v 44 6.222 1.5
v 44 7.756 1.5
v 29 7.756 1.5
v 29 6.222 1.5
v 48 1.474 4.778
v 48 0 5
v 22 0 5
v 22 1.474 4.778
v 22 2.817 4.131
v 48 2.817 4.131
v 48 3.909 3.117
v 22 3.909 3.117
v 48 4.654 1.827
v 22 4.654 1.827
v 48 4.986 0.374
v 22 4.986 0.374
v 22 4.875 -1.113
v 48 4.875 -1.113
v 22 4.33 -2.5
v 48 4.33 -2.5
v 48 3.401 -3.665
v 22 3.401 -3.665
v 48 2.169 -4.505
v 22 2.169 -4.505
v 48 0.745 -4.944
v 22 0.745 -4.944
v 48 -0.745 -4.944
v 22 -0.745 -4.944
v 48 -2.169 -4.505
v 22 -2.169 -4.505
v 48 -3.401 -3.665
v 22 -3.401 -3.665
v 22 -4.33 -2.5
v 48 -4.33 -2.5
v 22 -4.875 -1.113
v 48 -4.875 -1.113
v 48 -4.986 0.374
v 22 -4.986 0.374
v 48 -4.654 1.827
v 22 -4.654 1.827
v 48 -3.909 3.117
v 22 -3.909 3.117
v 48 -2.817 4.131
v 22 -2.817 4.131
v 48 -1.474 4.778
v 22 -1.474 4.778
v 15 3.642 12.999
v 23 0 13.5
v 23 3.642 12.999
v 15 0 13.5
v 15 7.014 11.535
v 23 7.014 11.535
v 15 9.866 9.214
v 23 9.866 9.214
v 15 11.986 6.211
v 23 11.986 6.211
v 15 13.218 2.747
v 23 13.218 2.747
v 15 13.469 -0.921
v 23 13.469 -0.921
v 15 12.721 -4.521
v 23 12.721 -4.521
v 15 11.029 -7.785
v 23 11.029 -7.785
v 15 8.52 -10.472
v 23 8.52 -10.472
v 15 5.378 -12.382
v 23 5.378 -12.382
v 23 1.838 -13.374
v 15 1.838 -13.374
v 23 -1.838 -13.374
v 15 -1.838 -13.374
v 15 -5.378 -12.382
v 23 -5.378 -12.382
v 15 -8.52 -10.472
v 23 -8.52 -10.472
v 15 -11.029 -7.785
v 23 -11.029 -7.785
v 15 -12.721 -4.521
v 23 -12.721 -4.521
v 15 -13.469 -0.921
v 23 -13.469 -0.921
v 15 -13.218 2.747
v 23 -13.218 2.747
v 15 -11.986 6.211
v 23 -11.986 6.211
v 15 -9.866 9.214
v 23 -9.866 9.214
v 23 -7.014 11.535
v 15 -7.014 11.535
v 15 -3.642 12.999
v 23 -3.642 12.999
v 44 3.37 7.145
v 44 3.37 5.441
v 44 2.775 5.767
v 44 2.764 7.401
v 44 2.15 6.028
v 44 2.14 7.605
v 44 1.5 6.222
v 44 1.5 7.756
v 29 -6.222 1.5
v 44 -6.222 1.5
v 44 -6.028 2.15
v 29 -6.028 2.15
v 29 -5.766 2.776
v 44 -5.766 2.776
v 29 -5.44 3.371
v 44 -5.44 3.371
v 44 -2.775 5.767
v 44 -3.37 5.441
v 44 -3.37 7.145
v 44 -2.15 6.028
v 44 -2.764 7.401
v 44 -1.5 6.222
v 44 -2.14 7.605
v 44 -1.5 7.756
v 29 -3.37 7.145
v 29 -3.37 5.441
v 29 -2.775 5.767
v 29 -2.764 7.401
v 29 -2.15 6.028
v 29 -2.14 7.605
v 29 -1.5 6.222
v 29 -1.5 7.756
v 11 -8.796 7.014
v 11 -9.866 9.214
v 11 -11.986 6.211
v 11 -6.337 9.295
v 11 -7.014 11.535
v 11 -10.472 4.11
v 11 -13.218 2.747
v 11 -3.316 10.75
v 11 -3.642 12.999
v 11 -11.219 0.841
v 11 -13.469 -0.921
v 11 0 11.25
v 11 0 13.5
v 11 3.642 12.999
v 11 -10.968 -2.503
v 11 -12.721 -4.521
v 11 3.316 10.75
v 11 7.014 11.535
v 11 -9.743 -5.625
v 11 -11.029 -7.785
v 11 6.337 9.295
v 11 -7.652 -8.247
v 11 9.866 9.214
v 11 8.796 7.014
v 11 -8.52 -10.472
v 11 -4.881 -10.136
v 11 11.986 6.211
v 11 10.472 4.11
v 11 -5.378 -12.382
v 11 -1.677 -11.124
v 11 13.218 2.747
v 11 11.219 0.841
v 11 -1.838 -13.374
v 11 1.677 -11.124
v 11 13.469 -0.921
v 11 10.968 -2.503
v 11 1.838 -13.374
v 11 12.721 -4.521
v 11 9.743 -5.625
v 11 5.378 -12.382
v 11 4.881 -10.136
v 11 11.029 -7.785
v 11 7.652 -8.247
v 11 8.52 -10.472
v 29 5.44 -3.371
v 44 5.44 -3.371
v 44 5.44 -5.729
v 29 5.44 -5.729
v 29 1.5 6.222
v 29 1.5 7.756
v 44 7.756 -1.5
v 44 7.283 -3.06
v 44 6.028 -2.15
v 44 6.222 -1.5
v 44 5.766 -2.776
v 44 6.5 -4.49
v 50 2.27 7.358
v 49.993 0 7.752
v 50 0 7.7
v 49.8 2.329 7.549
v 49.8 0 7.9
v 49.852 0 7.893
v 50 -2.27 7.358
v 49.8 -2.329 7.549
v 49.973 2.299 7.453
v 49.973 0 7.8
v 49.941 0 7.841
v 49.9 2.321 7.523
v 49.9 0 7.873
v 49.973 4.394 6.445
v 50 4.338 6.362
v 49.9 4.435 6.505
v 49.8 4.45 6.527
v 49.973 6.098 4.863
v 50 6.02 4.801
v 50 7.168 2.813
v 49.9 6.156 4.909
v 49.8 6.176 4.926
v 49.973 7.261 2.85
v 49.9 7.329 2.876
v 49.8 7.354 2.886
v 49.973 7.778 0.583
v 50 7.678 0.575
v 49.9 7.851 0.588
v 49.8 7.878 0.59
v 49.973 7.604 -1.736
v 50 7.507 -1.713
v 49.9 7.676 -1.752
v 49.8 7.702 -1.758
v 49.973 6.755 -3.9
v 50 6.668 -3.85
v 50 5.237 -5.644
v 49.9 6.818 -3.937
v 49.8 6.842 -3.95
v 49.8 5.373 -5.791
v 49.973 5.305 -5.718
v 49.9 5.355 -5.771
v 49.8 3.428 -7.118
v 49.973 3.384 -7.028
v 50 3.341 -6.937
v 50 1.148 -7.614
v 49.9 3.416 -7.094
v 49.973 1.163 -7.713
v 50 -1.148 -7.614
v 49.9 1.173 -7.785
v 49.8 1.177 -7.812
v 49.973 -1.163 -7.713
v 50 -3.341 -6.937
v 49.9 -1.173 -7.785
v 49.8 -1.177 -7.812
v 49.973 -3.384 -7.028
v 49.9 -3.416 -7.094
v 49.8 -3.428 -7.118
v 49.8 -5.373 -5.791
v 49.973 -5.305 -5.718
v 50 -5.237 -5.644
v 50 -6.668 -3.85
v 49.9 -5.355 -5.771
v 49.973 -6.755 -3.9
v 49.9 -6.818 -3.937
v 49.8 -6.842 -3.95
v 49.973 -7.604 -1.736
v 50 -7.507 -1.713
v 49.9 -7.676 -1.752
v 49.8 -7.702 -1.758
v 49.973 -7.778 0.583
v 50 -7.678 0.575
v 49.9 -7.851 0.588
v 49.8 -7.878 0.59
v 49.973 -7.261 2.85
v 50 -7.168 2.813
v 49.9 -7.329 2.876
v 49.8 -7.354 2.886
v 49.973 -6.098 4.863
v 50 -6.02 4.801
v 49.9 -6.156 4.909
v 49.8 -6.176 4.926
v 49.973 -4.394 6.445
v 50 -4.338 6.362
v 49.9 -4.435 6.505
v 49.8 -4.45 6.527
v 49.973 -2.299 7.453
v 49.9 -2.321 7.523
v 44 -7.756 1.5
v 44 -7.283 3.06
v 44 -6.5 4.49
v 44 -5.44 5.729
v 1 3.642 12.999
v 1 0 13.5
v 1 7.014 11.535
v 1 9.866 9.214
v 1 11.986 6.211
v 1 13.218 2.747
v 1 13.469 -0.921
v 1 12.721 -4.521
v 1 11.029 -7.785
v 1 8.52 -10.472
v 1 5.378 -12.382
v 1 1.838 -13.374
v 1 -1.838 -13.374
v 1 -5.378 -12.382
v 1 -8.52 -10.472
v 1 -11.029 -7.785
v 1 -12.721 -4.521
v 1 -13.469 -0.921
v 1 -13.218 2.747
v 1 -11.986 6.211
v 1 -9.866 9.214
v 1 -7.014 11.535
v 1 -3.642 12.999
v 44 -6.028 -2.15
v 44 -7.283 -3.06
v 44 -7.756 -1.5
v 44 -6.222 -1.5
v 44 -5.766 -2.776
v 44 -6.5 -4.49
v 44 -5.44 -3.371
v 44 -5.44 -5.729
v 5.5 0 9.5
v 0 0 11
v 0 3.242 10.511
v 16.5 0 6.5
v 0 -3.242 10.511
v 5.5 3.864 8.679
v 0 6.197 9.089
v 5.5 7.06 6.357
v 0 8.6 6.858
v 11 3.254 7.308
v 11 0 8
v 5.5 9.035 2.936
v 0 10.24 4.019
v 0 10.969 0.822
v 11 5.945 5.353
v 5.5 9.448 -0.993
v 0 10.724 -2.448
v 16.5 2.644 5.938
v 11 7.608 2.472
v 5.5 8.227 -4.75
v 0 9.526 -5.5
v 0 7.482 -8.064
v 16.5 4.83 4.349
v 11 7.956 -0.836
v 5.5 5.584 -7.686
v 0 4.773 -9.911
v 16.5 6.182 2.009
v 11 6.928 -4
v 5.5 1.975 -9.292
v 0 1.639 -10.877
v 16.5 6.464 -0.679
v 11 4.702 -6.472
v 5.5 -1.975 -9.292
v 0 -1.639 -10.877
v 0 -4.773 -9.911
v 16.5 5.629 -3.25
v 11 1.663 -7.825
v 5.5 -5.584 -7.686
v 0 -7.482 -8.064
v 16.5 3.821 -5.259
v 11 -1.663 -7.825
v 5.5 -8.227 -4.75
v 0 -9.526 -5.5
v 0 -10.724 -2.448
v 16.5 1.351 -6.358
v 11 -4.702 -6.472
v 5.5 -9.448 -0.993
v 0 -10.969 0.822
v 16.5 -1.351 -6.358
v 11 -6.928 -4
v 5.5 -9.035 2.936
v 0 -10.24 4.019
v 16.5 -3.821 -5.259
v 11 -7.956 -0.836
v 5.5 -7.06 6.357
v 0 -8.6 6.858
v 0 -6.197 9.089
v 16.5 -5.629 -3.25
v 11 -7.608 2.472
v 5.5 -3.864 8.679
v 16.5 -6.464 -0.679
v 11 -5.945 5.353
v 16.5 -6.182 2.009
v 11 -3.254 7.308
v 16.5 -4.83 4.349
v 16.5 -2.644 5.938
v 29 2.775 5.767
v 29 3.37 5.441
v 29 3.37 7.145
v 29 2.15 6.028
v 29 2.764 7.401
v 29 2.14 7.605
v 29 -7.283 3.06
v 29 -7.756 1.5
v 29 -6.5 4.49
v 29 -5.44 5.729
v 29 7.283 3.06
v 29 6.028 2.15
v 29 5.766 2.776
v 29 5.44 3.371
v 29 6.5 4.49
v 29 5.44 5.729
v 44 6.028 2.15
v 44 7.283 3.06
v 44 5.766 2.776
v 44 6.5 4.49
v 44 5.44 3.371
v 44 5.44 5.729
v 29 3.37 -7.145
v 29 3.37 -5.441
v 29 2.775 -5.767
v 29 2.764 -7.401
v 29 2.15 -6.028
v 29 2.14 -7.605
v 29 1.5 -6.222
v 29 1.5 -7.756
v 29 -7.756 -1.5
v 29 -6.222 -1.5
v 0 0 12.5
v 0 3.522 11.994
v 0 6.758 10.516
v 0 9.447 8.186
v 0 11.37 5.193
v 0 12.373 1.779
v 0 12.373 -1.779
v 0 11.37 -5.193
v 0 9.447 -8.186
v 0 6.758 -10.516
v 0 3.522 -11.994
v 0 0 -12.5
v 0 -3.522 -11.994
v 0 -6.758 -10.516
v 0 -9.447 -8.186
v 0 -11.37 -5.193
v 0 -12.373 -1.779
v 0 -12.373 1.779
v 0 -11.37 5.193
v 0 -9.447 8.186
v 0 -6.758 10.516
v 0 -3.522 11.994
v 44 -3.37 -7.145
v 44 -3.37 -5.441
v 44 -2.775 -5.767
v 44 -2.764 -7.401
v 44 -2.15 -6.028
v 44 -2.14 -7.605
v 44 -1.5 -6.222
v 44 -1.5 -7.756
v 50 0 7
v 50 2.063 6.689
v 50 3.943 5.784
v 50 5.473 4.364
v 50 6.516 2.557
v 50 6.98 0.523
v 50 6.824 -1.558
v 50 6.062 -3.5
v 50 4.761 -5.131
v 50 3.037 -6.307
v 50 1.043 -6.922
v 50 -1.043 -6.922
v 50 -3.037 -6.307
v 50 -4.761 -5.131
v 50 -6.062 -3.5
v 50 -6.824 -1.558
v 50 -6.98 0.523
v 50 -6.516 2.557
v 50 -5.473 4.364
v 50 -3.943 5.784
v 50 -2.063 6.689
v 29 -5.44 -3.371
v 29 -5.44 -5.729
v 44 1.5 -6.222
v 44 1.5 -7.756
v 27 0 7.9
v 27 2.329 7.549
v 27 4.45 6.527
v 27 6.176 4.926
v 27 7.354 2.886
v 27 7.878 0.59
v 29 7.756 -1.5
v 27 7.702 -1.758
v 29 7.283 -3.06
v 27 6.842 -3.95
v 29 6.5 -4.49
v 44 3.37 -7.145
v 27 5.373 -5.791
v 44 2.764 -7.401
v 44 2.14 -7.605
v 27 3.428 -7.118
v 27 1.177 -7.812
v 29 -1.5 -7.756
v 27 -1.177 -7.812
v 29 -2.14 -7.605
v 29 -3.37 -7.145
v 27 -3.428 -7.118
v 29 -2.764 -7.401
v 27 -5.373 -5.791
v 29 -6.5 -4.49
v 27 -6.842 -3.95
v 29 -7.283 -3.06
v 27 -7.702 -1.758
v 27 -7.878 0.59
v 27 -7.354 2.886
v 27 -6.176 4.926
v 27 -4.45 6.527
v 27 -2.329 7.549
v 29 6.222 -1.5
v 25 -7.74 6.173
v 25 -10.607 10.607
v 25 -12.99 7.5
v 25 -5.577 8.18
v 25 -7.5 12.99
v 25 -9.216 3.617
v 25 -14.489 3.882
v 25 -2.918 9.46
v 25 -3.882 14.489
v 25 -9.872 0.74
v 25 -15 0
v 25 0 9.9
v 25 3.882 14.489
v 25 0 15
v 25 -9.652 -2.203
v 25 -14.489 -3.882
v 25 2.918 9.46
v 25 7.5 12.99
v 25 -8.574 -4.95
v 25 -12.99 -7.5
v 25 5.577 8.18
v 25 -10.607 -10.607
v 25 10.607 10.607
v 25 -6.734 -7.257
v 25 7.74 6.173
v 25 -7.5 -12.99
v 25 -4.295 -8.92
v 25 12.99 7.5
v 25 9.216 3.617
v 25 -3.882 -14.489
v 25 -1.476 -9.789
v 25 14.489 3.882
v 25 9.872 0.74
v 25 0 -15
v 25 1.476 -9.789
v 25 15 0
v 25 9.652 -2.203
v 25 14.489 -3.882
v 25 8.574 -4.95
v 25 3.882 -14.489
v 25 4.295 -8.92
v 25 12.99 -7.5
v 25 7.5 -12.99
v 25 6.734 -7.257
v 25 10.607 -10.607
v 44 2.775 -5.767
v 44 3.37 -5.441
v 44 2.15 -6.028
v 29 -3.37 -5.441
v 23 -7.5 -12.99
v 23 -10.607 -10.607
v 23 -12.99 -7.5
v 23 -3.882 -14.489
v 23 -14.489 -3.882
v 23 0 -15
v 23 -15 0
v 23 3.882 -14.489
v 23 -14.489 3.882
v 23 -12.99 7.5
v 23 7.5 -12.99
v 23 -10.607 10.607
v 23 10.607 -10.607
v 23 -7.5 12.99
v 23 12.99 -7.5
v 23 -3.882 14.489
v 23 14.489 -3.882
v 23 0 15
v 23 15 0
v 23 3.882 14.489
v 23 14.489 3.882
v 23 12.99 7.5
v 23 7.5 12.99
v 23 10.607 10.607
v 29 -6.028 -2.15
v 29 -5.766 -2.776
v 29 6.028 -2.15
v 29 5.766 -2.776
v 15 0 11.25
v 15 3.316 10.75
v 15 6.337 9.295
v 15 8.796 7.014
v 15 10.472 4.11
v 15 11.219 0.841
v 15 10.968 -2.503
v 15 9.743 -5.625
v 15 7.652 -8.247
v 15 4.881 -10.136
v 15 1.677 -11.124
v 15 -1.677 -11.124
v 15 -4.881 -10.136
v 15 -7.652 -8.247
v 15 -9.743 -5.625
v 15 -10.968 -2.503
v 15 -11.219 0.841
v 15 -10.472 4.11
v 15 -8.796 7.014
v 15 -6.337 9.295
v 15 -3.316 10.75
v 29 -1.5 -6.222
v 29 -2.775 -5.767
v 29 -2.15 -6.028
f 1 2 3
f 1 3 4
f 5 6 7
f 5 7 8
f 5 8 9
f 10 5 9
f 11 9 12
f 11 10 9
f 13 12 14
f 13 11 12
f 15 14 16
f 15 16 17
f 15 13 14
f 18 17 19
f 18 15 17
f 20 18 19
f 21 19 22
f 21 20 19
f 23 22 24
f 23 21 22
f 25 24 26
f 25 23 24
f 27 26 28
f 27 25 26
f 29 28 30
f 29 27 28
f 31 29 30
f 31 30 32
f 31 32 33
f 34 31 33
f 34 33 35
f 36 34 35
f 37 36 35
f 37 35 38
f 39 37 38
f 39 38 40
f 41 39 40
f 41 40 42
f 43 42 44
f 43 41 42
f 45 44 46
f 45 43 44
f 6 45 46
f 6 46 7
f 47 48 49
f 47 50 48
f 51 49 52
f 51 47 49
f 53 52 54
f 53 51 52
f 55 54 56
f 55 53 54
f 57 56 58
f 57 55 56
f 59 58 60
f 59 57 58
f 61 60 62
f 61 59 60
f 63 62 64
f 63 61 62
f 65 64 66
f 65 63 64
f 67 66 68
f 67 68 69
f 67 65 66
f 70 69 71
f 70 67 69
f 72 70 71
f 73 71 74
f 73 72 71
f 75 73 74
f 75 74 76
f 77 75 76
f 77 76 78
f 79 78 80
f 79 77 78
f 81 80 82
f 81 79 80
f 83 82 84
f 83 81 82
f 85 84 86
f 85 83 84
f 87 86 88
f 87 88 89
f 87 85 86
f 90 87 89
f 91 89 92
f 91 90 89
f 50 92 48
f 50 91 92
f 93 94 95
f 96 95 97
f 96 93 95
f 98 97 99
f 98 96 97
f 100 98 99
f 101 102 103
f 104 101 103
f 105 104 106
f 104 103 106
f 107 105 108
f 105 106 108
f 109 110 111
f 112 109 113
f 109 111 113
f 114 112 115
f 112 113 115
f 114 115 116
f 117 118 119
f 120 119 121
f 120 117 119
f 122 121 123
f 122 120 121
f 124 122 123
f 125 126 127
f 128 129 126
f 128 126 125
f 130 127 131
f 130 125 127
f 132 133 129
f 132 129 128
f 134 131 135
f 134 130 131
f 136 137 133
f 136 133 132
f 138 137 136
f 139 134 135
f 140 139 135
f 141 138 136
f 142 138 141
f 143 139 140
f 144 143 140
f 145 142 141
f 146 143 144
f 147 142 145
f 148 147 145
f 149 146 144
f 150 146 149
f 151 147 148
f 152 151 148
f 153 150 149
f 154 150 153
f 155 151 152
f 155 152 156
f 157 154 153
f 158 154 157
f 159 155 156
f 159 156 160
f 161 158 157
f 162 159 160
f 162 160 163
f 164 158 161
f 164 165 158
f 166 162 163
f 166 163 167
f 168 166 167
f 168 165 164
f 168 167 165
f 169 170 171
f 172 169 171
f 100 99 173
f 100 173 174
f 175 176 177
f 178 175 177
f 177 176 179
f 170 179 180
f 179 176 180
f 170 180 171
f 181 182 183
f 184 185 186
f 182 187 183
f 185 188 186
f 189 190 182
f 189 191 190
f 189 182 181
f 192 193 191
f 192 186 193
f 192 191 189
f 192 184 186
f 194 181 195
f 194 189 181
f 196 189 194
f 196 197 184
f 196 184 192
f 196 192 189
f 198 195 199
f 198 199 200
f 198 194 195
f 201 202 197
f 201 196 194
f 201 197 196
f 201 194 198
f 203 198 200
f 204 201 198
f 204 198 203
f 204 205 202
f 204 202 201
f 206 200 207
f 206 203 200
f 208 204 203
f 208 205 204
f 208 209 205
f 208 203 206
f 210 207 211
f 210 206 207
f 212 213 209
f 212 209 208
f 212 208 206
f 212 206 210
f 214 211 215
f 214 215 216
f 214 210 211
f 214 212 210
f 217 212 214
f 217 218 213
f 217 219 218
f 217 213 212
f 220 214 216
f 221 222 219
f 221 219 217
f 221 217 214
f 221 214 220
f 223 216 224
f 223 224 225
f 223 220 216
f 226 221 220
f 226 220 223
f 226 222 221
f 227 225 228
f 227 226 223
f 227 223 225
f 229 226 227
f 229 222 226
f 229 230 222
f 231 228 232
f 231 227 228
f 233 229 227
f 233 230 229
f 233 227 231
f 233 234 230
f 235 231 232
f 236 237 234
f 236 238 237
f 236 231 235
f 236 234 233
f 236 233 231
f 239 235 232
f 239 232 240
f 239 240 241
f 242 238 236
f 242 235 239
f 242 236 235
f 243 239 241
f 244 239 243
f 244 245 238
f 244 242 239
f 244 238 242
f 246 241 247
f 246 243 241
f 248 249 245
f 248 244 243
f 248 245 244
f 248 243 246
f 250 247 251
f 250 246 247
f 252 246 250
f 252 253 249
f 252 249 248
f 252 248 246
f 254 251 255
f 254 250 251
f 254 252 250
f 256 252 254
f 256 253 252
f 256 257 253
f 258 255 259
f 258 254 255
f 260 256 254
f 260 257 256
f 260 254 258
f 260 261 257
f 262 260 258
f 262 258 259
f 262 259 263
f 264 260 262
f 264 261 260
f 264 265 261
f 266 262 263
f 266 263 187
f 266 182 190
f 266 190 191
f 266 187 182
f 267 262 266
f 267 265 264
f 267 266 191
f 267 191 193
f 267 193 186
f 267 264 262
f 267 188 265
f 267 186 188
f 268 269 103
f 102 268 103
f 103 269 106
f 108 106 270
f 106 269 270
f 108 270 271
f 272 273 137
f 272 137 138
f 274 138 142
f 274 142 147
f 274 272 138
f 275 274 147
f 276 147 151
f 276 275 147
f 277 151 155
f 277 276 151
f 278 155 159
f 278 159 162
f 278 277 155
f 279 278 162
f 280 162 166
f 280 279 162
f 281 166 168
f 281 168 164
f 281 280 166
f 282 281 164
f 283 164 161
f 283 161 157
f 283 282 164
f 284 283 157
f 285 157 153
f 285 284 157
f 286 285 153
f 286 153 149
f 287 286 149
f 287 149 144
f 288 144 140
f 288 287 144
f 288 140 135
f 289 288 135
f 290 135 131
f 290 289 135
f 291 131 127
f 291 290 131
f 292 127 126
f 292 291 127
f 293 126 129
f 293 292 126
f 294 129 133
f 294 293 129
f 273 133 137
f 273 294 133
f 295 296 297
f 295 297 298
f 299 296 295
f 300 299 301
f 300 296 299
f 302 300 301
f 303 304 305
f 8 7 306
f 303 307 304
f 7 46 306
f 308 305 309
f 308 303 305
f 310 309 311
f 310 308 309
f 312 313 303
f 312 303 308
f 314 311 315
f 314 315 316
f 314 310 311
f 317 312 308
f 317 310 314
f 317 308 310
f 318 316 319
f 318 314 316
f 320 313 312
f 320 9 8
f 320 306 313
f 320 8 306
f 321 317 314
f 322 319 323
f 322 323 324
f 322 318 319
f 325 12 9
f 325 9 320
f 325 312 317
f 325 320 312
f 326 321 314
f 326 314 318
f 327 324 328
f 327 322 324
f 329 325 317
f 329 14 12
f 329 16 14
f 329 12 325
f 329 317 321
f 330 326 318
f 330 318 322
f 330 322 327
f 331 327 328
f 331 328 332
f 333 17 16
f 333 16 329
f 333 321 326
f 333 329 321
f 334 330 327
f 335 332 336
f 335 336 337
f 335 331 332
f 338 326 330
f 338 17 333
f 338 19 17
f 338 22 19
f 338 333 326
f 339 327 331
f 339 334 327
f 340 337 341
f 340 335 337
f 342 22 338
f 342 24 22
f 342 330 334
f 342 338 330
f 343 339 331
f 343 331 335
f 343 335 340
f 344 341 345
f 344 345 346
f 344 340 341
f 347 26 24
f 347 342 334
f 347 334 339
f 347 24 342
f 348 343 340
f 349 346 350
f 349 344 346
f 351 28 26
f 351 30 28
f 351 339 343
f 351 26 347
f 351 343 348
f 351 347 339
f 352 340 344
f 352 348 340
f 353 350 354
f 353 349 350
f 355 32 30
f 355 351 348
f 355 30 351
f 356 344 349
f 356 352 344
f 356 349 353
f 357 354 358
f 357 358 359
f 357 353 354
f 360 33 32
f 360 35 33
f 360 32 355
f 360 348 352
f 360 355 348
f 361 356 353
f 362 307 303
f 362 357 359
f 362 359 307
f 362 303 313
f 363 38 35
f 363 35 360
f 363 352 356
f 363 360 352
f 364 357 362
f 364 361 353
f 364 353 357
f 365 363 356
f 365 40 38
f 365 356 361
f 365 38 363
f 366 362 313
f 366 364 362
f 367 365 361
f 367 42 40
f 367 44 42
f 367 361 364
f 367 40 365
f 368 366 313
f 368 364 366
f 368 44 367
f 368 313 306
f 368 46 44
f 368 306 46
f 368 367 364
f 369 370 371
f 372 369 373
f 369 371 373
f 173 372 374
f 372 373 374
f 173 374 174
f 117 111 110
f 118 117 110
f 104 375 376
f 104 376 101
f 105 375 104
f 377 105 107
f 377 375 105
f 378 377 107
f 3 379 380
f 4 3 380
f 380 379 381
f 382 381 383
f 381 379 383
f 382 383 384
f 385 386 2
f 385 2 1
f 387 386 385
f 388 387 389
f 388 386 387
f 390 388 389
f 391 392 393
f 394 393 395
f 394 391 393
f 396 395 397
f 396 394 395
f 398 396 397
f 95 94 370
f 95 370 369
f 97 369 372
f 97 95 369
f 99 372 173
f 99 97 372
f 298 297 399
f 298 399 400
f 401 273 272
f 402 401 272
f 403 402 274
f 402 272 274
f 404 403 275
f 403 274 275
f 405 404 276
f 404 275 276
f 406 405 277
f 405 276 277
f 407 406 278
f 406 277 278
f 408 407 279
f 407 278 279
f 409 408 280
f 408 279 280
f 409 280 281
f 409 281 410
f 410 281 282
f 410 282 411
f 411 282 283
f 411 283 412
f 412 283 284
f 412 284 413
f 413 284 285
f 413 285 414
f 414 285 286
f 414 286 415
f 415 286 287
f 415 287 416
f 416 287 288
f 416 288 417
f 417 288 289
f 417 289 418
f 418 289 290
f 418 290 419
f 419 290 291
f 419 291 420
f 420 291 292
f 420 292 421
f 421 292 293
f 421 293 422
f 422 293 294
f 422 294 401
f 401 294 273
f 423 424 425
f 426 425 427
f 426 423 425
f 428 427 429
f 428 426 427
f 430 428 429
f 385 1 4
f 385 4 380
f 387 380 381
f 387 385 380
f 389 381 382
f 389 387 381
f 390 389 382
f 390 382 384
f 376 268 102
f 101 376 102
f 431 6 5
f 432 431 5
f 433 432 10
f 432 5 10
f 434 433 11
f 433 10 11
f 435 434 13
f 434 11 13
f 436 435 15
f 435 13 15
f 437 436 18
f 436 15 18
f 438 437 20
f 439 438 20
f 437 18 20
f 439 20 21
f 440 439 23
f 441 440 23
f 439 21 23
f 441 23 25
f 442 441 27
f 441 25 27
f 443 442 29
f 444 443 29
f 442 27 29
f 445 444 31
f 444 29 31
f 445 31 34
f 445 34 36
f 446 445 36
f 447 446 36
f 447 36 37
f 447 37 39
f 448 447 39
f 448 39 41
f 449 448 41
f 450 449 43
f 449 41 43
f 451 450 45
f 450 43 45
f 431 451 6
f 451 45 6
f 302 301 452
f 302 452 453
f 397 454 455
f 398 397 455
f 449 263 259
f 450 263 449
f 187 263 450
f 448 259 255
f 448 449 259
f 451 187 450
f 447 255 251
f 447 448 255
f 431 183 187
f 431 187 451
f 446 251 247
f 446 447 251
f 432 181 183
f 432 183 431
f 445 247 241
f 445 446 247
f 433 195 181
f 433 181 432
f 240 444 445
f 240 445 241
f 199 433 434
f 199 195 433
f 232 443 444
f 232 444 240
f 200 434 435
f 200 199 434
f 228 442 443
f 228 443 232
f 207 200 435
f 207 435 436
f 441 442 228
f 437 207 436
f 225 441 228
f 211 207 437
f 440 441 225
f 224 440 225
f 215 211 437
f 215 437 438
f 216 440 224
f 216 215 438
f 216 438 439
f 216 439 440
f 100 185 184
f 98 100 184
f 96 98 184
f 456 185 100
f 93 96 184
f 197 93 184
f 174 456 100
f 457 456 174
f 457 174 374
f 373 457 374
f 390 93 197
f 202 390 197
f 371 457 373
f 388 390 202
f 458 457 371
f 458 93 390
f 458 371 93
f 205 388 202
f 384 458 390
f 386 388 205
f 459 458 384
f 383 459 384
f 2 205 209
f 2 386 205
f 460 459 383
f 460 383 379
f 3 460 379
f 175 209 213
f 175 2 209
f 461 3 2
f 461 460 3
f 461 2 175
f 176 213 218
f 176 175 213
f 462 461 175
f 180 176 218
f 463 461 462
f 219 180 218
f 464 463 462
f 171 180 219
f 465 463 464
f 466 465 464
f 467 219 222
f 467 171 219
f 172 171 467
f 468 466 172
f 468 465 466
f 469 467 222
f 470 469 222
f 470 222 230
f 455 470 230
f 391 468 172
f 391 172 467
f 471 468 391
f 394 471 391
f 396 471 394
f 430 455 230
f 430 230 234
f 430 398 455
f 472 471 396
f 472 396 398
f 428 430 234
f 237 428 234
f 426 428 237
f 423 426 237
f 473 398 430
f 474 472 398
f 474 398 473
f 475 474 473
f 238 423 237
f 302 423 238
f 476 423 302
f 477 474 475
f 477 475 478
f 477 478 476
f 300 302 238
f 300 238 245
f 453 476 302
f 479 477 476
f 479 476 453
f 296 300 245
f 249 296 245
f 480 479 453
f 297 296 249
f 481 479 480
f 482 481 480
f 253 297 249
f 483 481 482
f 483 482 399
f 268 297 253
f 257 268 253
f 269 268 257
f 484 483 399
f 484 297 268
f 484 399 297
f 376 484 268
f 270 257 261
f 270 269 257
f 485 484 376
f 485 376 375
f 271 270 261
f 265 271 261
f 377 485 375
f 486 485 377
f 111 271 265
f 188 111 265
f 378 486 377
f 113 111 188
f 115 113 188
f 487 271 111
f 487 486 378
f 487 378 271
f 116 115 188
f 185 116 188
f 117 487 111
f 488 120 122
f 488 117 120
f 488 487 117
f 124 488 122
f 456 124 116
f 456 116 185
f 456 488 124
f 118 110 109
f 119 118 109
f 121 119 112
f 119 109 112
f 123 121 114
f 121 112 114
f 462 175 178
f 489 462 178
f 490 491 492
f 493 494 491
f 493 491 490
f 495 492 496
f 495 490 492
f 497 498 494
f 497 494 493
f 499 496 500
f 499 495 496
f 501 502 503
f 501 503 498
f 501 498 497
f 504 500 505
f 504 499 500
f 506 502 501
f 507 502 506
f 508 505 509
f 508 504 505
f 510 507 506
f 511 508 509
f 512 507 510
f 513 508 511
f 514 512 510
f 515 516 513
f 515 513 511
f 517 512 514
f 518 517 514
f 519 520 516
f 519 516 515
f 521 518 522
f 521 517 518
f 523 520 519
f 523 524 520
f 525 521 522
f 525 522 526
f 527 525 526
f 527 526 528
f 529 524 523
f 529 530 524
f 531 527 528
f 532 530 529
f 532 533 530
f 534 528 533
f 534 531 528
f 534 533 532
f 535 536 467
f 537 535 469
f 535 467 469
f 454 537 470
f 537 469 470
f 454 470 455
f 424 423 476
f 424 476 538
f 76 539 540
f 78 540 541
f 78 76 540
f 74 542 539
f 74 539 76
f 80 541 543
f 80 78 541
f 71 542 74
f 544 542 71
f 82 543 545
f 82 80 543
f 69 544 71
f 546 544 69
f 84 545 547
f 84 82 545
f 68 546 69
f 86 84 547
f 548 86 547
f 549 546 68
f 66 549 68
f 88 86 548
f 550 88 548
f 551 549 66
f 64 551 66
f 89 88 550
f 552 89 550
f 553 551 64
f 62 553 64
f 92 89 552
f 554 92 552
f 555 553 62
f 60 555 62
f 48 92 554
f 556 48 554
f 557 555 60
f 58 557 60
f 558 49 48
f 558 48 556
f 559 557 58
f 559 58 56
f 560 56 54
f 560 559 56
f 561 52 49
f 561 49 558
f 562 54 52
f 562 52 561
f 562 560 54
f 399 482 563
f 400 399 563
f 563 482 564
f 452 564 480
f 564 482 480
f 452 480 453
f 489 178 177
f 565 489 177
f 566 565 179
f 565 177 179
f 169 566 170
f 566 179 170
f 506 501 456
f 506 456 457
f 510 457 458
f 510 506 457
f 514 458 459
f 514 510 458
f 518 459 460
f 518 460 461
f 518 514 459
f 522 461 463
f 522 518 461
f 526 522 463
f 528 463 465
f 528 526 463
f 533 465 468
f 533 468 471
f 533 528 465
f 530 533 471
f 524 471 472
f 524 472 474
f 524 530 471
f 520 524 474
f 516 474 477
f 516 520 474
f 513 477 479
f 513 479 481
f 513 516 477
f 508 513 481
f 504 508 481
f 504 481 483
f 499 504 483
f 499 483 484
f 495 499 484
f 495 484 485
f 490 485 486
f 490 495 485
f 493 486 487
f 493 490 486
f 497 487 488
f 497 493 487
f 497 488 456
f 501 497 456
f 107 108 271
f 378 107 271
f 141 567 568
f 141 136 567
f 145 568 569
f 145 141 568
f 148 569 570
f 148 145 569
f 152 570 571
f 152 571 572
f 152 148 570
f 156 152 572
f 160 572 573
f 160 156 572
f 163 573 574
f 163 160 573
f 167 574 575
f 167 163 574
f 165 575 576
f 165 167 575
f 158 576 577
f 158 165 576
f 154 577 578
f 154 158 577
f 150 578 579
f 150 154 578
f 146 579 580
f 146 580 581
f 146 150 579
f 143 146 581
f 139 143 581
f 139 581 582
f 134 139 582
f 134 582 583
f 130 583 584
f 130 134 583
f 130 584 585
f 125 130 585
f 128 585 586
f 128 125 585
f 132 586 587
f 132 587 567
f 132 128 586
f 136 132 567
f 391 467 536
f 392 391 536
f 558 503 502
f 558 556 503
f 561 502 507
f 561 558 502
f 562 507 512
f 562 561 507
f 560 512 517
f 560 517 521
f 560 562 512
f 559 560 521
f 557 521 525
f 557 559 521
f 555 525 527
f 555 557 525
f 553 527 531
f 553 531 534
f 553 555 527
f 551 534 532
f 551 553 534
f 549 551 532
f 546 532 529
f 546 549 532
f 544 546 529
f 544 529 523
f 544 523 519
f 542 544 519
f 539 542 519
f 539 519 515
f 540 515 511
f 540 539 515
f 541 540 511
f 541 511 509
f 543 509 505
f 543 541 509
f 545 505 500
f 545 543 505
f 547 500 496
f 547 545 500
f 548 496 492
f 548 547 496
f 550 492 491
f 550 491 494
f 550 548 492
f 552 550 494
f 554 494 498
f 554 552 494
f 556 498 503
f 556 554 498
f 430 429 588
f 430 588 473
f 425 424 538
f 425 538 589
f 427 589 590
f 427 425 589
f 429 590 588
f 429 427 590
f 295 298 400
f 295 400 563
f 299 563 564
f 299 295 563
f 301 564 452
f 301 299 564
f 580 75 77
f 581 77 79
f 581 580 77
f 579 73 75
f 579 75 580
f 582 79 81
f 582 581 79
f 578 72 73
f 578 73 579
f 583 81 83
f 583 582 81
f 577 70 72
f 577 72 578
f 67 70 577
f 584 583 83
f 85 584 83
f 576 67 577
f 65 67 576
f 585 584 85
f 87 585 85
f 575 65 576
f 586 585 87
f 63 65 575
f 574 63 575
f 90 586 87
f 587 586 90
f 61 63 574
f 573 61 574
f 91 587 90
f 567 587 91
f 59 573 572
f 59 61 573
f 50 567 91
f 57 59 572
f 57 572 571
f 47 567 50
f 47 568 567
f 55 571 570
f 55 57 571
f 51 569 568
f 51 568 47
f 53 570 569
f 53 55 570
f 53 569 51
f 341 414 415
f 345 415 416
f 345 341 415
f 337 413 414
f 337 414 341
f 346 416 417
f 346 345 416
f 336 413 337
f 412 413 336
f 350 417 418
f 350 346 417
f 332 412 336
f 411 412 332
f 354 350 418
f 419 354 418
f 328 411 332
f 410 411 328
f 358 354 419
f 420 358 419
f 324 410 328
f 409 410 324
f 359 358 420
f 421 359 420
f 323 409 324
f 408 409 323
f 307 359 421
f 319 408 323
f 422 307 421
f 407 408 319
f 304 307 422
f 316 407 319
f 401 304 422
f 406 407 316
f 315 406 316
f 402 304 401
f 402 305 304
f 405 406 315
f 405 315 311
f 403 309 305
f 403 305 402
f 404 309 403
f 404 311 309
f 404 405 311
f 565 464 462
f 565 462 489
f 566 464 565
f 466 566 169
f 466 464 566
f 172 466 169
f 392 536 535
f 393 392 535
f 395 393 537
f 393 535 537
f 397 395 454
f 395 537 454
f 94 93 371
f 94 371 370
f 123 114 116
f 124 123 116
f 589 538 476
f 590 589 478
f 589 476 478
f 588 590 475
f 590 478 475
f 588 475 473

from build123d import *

# Parameters (mm, degrees)
F2_R             = 0.2
F3_SIZE          = 2
F4_SIZE          = 1
F7_DEPTH         = 15
F7_COPIES2_COUNT = 2


# Not quite as in the source:
# - a pattern or mirror of a feature is missing from the dataset's text; its kind, count and spacing are read off the source's solid


with BuildPart() as f1:
    # F0 (on Front) → F1 (revolve)
    with BuildSketch(Plane.XZ):
        Polygon((0, 13.5), (0, 11), (22, 5), (50, 5), (50, 7.9), (25, 7.9), (25, 15), (23, 15), (23, 13.5), (15, 13.5), (15, 11.25), (11, 11.25), (11, 13.5), align=None)
    revolve(axis=Axis((18.4335876124, 0, 0), (-1, 0, 0)))

    # F2
    f2_edges = [f1.edges().sort_by_distance(p)[0] for p in [
        (50, 0, -7.9),
    ]]
    fillet(f2_edges, radius=F2_R)

    # F3
    f3_edges = [f1.edges().sort_by_distance(p)[0] for p in [
        (50, 0, -5),
        (25, 0, -7.9),
    ]]
    chamfer(f3_edges, length=F3_SIZE)

    # F4
    f4_edges = [f1.edges().sort_by_distance(p)[0] for p in [
        (0, 0, -13.5),
    ]]
    chamfer(f4_edges, length=F4_SIZE)

    # F6 (on offset) → F7 (cut)
    with BuildSketch(Plane.YZ.offset(44)):
        with BuildLine():
            ThreePointArc((-3.37, 5.4408730917), (-2.4661025438, 5.905788537), (-1.5, 6.2217360921))
            Line((-1.5, 6.2217360921), (-1.5, 7.7562877719))
            ThreePointArc((-1.5, 7.7562877719), (-2.4540983699, 7.5091544924), (-3.37, 7.145145205))
            Line((-3.37, 7.145145205), (-3.37, 5.4408730917))
        make_face()
        with BuildLine():
            Line((-5.44, 3.3714092009), (-5.44, 5.7285600285))
            ThreePointArc((-5.44, 5.7285600285), (-6.928613333, 3.7953020014), (-7.7562877719, 1.5))
            Line((-7.7562877719, 1.5), (-6.2217360921, 1.5))
            ThreePointArc((-6.2217360921, 1.5), (-5.9054690982, 2.4668673921), (-5.44, 3.3714092009))
        make_face()
    f7 = extrude(amount=-F7_DEPTH, mode=Mode.SUBTRACT)

    # F7_copies: F7 across plane
    add(f7.mirror(Plane.ZX), mode=Mode.SUBTRACT)

    # F7_copies1: F7 across plane
    add(f7.mirror(Plane(origin=(0, 0, 0), x_dir=(-1, 0, 0), z_dir=(0, 0, -1))), mode=Mode.SUBTRACT)

    # F7_copies2: F7 ×2 about axis
    f7_copies2_axis = Axis((0, 0, 0), (1, 0, 0))
    for i in range(1, F7_COPIES2_COUNT):
        add(f7.rotate(f7_copies2_axis, i * 360 / F7_COPIES2_COUNT), mode=Mode.SUBTRACT)


solid = f1.part
